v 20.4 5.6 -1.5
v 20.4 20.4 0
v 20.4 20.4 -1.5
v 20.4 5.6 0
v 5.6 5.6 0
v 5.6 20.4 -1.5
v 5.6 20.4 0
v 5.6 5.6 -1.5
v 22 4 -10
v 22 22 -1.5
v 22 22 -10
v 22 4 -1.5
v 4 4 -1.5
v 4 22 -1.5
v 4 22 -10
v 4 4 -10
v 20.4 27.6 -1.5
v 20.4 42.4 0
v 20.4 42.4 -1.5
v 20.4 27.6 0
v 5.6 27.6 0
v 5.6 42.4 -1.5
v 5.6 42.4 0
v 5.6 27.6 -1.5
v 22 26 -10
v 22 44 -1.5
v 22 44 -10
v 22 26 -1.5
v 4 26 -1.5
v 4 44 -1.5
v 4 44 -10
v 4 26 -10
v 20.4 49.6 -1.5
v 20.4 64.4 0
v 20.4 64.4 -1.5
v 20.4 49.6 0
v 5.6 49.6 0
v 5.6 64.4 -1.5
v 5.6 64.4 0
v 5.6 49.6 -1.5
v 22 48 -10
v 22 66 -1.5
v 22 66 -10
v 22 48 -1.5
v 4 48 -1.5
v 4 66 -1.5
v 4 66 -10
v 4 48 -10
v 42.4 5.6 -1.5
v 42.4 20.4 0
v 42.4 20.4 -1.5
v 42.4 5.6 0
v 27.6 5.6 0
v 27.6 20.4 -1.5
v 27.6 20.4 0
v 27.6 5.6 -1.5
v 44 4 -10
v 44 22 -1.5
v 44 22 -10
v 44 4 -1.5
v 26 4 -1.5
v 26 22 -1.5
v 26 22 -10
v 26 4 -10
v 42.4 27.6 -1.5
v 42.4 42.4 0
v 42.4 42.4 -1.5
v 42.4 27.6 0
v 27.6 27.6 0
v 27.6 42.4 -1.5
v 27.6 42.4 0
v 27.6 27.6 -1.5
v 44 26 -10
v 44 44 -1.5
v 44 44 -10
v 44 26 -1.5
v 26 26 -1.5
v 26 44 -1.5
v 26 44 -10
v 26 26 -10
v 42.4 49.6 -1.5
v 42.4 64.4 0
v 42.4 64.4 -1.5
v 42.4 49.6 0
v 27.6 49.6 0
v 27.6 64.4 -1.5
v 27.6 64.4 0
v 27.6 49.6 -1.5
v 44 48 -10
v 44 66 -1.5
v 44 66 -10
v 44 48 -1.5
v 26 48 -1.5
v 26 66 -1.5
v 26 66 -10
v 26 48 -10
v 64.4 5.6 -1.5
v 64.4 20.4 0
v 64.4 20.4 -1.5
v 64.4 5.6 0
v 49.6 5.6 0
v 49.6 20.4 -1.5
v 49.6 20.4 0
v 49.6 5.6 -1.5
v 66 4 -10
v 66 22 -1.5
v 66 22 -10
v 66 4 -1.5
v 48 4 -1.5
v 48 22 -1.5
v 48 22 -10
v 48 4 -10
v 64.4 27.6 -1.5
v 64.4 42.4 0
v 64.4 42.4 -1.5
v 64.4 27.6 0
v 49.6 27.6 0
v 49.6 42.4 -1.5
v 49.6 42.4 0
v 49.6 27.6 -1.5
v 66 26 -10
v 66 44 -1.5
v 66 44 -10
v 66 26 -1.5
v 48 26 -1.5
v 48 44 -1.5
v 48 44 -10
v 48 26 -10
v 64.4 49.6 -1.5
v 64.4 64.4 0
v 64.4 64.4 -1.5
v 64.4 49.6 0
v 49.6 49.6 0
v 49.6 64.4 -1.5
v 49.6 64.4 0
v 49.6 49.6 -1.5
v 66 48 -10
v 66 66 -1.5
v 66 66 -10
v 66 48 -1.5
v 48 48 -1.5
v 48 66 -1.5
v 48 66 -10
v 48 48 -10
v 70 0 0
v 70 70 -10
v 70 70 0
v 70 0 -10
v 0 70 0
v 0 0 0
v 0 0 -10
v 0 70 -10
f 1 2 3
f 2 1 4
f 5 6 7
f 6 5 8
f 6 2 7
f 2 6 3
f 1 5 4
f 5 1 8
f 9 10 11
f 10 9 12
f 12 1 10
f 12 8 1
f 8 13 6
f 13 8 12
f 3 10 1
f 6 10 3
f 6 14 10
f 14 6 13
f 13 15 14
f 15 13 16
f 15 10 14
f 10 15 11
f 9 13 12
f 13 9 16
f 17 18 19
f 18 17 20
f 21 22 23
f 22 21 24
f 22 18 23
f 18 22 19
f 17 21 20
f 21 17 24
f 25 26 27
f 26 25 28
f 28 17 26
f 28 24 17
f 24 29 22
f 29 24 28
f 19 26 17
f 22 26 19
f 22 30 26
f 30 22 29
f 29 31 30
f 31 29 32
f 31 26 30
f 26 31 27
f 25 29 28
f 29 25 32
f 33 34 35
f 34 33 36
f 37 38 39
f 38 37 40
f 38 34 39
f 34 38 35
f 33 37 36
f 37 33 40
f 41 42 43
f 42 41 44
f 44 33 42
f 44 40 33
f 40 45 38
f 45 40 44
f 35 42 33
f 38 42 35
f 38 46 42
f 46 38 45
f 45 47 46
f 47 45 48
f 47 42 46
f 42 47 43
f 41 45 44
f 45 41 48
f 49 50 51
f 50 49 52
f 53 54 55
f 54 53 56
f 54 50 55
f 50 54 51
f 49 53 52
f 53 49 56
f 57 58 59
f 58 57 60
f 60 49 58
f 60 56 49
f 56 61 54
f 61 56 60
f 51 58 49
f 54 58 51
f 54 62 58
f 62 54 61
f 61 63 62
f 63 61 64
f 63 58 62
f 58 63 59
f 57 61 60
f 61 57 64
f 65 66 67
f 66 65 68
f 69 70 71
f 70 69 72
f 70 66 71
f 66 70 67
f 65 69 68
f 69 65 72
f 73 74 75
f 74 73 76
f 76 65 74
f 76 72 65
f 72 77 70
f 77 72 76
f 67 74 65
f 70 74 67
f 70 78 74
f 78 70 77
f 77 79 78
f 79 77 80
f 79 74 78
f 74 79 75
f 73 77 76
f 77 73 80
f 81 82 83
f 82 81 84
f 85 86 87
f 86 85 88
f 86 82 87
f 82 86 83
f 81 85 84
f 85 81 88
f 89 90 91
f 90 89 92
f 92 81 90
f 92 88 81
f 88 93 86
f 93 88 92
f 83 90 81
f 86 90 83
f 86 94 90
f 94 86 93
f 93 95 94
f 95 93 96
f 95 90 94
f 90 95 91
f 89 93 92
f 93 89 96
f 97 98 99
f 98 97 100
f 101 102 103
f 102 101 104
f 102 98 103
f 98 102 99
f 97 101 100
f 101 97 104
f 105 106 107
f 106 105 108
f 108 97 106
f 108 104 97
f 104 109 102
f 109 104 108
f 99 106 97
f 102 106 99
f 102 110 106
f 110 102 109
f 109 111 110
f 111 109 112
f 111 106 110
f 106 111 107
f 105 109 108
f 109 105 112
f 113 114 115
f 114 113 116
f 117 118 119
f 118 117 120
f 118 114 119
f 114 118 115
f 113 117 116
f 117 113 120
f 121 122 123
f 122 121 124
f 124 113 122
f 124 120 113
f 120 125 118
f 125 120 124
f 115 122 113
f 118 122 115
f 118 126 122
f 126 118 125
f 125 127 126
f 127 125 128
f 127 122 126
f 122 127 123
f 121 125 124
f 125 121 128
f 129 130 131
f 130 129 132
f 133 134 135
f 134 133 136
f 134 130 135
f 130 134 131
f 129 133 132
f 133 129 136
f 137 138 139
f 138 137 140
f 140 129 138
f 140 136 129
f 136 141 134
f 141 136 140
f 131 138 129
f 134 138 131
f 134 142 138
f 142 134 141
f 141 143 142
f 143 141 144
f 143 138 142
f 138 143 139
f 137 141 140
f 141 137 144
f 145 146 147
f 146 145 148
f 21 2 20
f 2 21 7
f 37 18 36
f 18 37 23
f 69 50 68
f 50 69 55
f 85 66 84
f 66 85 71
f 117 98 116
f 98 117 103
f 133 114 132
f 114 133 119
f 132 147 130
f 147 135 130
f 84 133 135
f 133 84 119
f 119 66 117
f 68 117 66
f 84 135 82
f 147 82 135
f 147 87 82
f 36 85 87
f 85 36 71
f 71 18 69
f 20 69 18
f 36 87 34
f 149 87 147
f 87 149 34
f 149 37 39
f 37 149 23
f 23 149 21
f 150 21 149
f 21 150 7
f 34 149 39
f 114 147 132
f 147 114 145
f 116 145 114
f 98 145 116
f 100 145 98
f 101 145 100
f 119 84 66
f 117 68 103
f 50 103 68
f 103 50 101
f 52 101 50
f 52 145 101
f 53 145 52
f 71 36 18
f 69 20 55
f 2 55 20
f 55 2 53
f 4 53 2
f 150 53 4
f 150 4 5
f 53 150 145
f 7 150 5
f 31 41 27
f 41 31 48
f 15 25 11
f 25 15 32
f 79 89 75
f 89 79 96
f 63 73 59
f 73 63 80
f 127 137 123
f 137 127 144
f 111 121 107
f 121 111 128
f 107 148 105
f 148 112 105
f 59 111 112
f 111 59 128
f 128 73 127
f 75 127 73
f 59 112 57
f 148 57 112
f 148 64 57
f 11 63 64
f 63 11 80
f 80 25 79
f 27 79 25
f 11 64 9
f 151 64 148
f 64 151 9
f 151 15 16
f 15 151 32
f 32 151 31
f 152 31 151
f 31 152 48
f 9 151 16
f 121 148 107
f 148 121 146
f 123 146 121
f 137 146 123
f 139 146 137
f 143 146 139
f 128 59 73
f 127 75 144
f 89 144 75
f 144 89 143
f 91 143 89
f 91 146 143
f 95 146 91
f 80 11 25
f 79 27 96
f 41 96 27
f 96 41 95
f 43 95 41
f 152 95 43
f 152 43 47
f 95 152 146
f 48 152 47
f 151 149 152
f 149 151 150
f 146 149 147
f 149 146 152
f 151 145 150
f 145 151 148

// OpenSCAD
keyDistance=4;
keyUpper=14.8;
keyLower=18;
keyLip=1.5;
keyHeight=10;

module keySlot(upper, lower) {
  translate([0,0,-1.5]){
    translate([0,0,3])
    cube([upper, upper, 12], center=true);
    translate([0,0,-10])
    cube([lower, lower, 20], center=true);
  }
}

function getDimension(nrKeys) = (nrKeys * (keyLower + keyDistance)) + keyDistance;
function getPosition(nrKeys) = (nrKeys * (keyLower + keyDistance)) + keyLower/2 + keyDistance;

size=3;

width=getDimension(size);
difference(){
  translate([0,0,-keyHeight])
  cube([width,width, keyHeight]);
  for (x =[0:size-1]){
    for (y =[0:size-1]){
      xp=getPosition(x);
      yp=getPosition(y);
      translate([xp,yp,0])
      keySlot(keyUpper, keyLower);
    }
  }
}
